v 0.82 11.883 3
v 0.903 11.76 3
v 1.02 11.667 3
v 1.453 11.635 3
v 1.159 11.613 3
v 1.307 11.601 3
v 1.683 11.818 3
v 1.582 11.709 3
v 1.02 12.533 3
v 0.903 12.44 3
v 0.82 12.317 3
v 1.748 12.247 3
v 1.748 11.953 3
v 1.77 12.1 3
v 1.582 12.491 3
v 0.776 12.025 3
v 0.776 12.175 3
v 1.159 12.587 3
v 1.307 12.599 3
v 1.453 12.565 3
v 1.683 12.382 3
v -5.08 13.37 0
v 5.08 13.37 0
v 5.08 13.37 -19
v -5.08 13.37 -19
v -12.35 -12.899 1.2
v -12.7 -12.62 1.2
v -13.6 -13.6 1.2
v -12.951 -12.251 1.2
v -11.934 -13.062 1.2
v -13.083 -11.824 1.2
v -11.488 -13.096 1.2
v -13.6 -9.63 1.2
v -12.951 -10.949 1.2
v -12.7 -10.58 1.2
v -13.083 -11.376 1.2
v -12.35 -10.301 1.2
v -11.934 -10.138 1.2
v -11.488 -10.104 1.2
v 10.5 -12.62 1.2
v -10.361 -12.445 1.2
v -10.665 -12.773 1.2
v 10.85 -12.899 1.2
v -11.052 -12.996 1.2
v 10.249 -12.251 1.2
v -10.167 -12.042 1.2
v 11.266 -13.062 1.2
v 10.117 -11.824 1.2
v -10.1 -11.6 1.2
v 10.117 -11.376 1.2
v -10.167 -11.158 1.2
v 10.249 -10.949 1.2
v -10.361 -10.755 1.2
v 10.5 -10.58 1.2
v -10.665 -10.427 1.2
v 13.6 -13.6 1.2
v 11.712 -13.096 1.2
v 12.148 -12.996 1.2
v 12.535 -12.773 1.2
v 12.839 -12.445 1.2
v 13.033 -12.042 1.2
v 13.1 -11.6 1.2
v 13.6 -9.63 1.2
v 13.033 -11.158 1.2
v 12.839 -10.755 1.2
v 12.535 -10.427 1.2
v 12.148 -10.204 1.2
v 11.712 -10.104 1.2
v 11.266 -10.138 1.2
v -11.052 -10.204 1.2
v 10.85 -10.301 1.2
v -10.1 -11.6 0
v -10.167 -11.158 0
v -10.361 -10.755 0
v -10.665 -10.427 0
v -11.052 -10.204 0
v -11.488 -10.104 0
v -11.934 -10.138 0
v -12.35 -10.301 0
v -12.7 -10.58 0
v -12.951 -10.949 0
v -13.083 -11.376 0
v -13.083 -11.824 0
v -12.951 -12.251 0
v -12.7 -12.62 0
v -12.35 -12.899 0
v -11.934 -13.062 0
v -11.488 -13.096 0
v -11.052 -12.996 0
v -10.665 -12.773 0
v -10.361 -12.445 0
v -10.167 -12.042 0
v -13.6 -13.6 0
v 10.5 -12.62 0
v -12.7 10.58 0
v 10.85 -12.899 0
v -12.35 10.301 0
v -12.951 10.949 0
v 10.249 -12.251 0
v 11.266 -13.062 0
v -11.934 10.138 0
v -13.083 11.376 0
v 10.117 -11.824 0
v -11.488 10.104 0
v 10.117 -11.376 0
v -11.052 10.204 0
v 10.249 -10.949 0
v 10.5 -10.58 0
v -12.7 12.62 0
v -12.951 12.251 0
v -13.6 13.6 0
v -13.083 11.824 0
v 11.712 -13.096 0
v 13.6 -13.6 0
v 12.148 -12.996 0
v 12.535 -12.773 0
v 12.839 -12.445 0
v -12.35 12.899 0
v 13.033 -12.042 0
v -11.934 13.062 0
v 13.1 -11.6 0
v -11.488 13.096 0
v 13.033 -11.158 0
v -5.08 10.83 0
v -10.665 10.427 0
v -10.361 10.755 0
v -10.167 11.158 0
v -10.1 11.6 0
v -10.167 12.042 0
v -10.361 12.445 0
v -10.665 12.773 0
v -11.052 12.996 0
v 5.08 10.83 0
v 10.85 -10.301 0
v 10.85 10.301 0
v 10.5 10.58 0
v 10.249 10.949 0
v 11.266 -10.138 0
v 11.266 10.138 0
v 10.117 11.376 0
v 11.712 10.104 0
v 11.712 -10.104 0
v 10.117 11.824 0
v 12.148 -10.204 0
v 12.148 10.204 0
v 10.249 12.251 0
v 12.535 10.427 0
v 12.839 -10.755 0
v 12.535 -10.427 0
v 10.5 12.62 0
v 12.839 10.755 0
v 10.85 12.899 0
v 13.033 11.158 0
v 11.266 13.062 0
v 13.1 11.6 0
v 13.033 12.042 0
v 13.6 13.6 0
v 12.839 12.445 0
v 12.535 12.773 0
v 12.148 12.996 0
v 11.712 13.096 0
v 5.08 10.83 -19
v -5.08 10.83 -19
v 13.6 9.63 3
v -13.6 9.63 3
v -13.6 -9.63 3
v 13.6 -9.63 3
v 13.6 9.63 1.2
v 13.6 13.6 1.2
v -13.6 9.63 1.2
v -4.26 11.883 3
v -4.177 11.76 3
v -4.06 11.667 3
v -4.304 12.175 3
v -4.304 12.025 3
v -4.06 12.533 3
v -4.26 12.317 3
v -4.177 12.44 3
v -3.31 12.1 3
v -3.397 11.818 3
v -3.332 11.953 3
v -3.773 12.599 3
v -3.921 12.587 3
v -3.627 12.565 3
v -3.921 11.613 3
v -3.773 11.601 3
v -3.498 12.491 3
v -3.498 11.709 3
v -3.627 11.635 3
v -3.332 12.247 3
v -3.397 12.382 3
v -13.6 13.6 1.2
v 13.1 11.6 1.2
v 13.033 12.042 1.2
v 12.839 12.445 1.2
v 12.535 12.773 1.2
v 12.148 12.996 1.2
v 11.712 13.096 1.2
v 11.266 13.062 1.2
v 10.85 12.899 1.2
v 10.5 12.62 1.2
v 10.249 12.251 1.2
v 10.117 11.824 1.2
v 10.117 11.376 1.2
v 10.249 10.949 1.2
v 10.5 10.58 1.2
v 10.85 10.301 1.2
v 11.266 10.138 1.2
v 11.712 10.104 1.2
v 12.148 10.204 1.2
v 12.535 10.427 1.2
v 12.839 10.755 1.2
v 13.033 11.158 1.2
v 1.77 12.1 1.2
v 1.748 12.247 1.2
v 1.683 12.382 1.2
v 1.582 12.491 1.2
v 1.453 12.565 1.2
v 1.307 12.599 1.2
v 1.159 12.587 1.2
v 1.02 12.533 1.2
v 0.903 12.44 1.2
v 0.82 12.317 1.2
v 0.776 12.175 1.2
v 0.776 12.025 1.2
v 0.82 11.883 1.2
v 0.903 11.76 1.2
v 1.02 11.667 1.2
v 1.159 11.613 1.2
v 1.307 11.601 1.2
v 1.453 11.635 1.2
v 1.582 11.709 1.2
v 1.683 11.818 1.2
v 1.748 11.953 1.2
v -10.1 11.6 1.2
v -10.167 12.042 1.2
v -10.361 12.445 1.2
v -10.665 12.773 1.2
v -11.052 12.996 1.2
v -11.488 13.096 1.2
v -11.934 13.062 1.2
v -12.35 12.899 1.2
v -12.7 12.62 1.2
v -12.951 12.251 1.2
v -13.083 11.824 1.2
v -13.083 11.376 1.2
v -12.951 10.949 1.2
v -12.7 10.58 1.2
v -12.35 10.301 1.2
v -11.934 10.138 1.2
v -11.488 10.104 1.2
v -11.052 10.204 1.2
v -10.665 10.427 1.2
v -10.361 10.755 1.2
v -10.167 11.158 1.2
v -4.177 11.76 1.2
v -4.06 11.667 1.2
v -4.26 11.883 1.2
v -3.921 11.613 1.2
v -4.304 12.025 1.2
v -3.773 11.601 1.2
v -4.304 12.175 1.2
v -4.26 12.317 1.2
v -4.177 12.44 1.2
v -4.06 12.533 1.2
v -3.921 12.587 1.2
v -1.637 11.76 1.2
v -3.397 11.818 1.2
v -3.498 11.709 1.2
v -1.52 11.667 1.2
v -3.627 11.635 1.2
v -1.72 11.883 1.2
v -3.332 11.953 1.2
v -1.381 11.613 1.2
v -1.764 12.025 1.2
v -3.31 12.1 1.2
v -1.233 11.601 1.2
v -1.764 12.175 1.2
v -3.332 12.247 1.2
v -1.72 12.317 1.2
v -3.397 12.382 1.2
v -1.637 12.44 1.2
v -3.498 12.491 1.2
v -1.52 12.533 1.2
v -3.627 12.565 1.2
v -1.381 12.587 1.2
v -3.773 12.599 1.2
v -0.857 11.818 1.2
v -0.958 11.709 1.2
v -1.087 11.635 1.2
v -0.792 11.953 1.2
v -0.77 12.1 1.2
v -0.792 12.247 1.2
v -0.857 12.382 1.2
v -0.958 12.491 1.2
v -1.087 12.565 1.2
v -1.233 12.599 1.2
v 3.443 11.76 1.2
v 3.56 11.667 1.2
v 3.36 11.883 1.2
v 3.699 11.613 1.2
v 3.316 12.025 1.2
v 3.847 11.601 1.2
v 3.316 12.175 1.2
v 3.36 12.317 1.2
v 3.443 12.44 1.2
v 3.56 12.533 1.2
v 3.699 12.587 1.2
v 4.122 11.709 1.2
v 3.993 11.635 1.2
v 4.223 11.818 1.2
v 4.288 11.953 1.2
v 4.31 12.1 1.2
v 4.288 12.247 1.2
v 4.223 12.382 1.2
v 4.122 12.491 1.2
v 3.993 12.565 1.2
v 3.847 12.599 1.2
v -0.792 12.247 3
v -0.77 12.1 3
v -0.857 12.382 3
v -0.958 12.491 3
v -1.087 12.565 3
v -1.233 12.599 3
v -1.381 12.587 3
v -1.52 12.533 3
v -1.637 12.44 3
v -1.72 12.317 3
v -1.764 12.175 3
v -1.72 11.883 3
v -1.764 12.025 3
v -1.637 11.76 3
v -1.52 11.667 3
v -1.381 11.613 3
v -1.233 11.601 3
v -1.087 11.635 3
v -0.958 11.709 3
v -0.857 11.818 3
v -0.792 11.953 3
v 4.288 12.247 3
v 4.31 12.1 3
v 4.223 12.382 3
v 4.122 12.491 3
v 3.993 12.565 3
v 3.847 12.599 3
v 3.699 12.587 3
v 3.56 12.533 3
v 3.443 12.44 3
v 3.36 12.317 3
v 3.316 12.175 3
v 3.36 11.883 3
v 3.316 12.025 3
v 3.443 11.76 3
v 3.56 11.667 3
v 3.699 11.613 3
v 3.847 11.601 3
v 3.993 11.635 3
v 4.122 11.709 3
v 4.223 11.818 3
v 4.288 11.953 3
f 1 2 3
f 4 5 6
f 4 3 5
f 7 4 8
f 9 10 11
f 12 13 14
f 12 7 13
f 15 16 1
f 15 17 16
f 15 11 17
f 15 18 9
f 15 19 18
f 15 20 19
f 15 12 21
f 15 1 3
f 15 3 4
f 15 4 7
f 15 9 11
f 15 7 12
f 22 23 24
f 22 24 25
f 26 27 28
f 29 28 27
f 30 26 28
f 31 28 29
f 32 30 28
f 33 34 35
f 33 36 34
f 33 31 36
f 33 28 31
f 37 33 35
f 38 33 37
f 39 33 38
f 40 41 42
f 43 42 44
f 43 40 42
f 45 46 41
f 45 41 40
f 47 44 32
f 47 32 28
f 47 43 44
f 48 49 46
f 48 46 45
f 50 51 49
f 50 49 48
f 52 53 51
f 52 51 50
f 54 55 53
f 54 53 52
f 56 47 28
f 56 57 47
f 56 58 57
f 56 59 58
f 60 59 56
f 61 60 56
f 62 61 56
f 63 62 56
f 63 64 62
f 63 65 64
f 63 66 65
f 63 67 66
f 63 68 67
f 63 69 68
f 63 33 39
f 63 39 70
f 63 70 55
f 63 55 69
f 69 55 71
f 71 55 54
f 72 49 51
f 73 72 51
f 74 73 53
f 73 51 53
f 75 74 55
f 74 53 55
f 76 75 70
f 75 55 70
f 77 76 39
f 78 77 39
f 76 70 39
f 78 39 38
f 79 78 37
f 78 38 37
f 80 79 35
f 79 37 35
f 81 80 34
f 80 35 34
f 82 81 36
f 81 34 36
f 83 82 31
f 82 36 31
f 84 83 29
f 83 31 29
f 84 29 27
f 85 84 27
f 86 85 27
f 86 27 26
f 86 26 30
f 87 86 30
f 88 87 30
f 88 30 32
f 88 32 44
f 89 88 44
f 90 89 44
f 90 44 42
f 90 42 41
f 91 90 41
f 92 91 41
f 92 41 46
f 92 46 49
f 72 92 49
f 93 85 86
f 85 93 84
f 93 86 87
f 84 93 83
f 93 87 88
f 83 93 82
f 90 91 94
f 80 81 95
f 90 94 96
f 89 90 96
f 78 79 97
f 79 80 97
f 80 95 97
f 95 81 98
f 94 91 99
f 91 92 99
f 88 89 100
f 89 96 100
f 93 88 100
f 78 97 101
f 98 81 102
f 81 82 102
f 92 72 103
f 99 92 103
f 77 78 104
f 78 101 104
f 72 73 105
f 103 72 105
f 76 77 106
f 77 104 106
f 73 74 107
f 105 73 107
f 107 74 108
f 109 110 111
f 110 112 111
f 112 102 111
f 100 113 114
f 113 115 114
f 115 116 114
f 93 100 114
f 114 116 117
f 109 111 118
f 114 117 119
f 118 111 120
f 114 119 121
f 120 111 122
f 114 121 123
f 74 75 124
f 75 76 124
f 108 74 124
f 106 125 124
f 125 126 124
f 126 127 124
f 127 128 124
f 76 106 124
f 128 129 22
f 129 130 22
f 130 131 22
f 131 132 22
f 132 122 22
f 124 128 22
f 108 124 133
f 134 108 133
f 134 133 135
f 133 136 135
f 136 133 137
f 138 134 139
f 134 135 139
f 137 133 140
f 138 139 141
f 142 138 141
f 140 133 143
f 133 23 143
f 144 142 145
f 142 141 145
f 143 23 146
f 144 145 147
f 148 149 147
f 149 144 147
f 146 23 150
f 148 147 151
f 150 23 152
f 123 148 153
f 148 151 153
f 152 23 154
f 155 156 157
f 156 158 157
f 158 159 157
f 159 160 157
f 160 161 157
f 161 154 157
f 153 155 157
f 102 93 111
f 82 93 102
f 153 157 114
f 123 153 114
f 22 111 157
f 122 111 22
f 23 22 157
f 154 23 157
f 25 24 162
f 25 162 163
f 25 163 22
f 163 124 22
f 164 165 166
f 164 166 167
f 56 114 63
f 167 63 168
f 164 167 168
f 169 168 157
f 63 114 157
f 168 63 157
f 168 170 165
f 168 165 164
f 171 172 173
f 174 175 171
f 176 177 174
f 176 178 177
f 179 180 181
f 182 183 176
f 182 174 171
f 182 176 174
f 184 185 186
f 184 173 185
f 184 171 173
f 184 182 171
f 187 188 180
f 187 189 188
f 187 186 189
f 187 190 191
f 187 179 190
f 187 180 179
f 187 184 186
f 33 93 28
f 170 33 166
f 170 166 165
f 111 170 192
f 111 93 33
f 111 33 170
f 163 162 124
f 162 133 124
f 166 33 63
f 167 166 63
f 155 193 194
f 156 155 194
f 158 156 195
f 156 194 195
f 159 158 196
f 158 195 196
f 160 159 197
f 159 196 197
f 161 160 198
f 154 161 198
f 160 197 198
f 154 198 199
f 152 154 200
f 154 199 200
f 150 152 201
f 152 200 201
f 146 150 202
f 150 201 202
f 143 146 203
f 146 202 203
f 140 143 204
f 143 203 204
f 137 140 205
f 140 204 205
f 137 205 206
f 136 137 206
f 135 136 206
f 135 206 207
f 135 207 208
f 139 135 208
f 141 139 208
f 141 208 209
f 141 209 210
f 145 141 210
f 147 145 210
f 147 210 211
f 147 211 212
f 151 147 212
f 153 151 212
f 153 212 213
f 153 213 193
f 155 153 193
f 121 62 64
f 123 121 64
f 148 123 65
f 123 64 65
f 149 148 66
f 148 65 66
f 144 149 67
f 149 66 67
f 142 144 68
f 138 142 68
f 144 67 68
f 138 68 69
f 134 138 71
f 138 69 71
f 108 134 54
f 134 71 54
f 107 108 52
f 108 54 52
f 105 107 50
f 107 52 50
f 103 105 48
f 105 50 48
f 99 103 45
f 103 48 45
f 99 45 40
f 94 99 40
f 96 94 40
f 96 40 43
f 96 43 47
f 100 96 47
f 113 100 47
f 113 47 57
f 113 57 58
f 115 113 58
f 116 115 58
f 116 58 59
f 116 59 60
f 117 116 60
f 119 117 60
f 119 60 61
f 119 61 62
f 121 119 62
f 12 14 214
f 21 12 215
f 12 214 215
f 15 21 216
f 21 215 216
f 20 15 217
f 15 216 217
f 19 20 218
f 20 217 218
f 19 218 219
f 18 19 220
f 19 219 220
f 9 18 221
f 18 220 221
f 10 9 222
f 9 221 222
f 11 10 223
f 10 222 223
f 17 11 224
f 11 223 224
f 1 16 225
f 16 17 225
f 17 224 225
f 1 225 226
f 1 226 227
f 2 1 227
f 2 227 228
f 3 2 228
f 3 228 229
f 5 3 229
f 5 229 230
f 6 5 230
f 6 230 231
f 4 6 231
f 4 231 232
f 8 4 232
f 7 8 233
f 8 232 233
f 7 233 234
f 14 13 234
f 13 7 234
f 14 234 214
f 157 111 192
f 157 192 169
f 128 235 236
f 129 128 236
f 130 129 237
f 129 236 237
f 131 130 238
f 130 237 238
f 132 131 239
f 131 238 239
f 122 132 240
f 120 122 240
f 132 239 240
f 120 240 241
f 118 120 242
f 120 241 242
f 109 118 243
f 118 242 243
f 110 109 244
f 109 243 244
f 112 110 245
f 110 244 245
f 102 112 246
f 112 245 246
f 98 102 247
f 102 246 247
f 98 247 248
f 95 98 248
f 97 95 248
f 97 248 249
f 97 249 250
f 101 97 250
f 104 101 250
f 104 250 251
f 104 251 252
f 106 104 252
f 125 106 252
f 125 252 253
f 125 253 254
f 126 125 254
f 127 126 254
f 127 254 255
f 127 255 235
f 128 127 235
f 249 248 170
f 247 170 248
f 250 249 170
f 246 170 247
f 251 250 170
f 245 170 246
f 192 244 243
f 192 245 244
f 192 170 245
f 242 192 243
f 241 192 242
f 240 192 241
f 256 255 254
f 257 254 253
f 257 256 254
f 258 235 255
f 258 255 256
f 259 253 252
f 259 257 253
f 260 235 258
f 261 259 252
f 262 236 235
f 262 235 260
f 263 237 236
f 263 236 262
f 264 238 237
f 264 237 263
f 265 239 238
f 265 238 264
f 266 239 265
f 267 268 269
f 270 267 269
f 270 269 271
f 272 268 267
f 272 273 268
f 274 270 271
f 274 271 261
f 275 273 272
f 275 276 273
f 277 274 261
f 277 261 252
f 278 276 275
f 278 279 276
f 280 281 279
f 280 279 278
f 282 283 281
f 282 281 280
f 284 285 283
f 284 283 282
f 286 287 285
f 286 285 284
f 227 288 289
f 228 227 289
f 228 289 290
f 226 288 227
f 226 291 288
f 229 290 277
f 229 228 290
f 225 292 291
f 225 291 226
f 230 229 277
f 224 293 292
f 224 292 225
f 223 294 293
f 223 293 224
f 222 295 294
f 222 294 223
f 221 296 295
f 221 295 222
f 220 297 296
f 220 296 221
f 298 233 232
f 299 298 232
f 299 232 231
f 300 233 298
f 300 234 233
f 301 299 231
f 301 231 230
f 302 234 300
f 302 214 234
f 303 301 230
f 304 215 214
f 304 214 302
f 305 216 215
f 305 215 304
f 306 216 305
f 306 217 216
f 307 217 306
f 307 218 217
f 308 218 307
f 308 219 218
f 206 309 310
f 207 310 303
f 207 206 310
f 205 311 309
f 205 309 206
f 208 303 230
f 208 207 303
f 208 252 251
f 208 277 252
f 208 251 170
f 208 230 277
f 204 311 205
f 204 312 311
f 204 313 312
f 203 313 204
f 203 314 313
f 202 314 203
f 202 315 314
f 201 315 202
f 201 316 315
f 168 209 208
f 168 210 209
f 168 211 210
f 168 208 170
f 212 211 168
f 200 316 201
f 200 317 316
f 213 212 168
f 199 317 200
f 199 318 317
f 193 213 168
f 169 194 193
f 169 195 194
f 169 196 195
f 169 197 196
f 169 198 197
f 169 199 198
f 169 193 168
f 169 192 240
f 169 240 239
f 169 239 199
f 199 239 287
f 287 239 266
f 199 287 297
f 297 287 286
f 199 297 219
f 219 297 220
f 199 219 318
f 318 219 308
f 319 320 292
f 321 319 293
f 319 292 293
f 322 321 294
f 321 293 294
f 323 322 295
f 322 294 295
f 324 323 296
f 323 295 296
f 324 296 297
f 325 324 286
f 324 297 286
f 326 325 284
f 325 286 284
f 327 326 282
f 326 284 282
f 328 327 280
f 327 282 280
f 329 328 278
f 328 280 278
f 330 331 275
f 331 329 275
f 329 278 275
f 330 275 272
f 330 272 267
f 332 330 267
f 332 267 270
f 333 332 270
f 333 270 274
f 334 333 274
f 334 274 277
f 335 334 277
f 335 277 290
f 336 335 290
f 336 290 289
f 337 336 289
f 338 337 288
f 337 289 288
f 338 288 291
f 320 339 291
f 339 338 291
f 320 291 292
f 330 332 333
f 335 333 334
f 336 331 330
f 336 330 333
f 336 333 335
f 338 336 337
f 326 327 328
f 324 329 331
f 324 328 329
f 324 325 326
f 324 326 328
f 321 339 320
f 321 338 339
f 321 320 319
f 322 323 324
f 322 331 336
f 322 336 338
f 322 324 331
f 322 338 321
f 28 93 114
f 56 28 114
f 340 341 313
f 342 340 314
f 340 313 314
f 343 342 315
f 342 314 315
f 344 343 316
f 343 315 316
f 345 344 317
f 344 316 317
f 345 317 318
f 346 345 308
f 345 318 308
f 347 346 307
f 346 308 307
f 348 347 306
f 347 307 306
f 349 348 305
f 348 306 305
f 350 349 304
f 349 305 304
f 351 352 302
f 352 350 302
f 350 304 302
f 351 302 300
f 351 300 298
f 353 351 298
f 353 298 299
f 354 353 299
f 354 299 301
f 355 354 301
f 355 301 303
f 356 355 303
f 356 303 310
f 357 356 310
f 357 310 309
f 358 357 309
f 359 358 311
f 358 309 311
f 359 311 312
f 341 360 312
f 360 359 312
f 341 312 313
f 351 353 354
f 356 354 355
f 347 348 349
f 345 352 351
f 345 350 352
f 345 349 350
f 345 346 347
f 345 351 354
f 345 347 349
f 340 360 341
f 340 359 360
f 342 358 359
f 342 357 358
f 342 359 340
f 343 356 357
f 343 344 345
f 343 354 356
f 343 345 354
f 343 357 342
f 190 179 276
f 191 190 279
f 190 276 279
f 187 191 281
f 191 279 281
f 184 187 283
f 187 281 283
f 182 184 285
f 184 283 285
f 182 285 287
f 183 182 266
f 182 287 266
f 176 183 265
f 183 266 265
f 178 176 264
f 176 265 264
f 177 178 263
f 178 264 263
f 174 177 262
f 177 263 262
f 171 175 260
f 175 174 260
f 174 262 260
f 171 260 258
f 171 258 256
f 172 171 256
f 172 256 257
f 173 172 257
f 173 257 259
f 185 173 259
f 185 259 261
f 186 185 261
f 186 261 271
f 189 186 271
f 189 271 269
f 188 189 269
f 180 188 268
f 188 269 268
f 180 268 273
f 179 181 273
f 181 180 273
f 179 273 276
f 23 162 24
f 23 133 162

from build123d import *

# Parameters (mm, degrees)
SKETCH_1_W                    = 27.2
SKETCH_1_H                    = 27.2
EXTRUDE_480_DEPTH             = 1.2
SKETCH_2_W                    = 27.2
SKETCH_2_H                    = 19.26
EXTRUDE_643_DEPTH             = 1.8
EXTRUDE_867_REACH             = 21.317
SKETCH_3_R                    = 0.5
EXTRUDE_867_DIRECTION_2_DEPTH = 9.2
SKETCH_4_R                    = 1.5
CUT_EXTRUDE_1140_DEPTH        = 22.320412754
SKETCH_5_W                    = 10.16
SKETCH_5_H                    = 2.54
EXTRUDE_1389_DEPTH            = 2
SKETCH_7_W                    = 10.16
SKETCH_7_H                    = 2.54
EXTRUDE_2113_DEPTH            = 17


with BuildPart() as part:
    # Эскиз1 → Extrude 480 (new body)
    with BuildSketch(Plane.XY):
        Rectangle(SKETCH_1_W, SKETCH_1_H)
    extrude(amount=EXTRUDE_480_DEPTH)

    # Эскиз2 → Extrude 643 (add)
    with BuildSketch(Plane.XY.offset(1.2)):
        Rectangle(SKETCH_2_W, SKETCH_2_H)
    extrude(amount=EXTRUDE_643_DEPTH)

    # Extrude 867: up to this face of the body (flat: up to its plane)
    extrude_867_end = Plane(part.part.faces().sort_by_distance((0, 0, 3))[0])
    # Эскиз3 → Extrude 867 (add, up to the picked face)
    with BuildSketch(Plane.XY.offset(1.2), mode=Mode.PRIVATE) as extrude_867_sk1:
        with Locations((-3.81, 12.1)):
            Circle(SKETCH_3_R)
    extrude_867_tool1 = split(extrude(extrude_867_sk1.sketch, amount=EXTRUDE_867_REACH, mode=Mode.PRIVATE), bisect_by=extrude_867_end, keep=Keep.BOTH, mode=Mode.PRIVATE)
    # Эскиз3 → Extrude 867 (add, up to the picked face)
    with BuildSketch(Plane.XY.offset(1.2), mode=Mode.PRIVATE) as extrude_867_sk2:
        with Locations((-1.27, 12.1)):
            Circle(SKETCH_3_R)
    extrude_867_tool2 = split(extrude(extrude_867_sk2.sketch, amount=EXTRUDE_867_REACH, mode=Mode.PRIVATE), bisect_by=extrude_867_end, keep=Keep.BOTH, mode=Mode.PRIVATE)
    # Эскиз3 → Extrude 867 (add, up to the picked face)
    with BuildSketch(Plane.XY.offset(1.2), mode=Mode.PRIVATE) as extrude_867_sk3:
        with Locations((1.27, 12.1)):
            Circle(SKETCH_3_R)
    extrude_867_tool3 = split(extrude(extrude_867_sk3.sketch, amount=EXTRUDE_867_REACH, mode=Mode.PRIVATE), bisect_by=extrude_867_end, keep=Keep.BOTH, mode=Mode.PRIVATE)
    # Эскиз3 → Extrude 867 (add, up to the picked face)
    with BuildSketch(Plane.XY.offset(1.2), mode=Mode.PRIVATE) as extrude_867_sk4:
        with Locations((3.81, 12.1)):
            Circle(SKETCH_3_R)
    extrude_867_tool4 = split(extrude(extrude_867_sk4.sketch, amount=EXTRUDE_867_REACH, mode=Mode.PRIVATE), bisect_by=extrude_867_end, keep=Keep.BOTH, mode=Mode.PRIVATE)
    add(extrude_867_tool1.solids().sort_by(Axis((-3.81, 12.1, 1.2), (0, 0, 1)))[0])
    add(extrude_867_tool2.solids().sort_by(Axis((-1.27, 12.1, 1.2), (0, 0, 1)))[0])
    add(extrude_867_tool3.solids().sort_by(Axis((1.27, 12.1, 1.2), (0, 0, 1)))[0])
    add(extrude_867_tool4.solids().sort_by(Axis((3.81, 12.1, 1.2), (0, 0, 1)))[0])

    # Эскиз3 → Extrude 867 direction 2 (add)
    with BuildSketch(Plane.XY.offset(1.2)):
        with Locations((-3.81, 12.1)):
            Circle(SKETCH_3_R)
        with Locations((-1.27, 12.1)):
            Circle(SKETCH_3_R)
        with Locations((1.27, 12.1)):
            Circle(SKETCH_3_R)
        with Locations((3.81, 12.1)):
            Circle(SKETCH_3_R)
    extrude(amount=-EXTRUDE_867_DIRECTION_2_DEPTH)

    # Эскиз4 → Cut-Extrude 1140 (cut, through all)
    with BuildSketch(Plane.XY.offset(1.2)):
        with Locations((-11.6, 11.6)):
            Circle(SKETCH_4_R)
        with Locations((11.6, 11.6)):
            Circle(SKETCH_4_R)
        with Locations((11.6, -11.6)):
            Circle(SKETCH_4_R)
        with Locations((-11.6, -11.6)):
            Circle(SKETCH_4_R)
    extrude(amount=-CUT_EXTRUDE_1140_DEPTH, mode=Mode.SUBTRACT)

    # Эскиз5 → Extrude 1389 (add)
    with BuildSketch(Plane(origin=(0, 0, 0), x_dir=(-1, 0, 0), z_dir=(0, 0, -1))):
        with Locations((0, 12.1)):
            Rectangle(SKETCH_5_W, SKETCH_5_H)
    extrude(amount=EXTRUDE_1389_DEPTH)

    # Эскиз7 → Extrude 2113 (add)
    with BuildSketch(Plane(origin=(0, 0, -2), x_dir=(-1, 0, 0), z_dir=(0, 0, -1))):
        with Locations((0, 12.1)):
            Rectangle(SKETCH_7_W, SKETCH_7_H)
    extrude(amount=EXTRUDE_2113_DEPTH)


solid = part.part
